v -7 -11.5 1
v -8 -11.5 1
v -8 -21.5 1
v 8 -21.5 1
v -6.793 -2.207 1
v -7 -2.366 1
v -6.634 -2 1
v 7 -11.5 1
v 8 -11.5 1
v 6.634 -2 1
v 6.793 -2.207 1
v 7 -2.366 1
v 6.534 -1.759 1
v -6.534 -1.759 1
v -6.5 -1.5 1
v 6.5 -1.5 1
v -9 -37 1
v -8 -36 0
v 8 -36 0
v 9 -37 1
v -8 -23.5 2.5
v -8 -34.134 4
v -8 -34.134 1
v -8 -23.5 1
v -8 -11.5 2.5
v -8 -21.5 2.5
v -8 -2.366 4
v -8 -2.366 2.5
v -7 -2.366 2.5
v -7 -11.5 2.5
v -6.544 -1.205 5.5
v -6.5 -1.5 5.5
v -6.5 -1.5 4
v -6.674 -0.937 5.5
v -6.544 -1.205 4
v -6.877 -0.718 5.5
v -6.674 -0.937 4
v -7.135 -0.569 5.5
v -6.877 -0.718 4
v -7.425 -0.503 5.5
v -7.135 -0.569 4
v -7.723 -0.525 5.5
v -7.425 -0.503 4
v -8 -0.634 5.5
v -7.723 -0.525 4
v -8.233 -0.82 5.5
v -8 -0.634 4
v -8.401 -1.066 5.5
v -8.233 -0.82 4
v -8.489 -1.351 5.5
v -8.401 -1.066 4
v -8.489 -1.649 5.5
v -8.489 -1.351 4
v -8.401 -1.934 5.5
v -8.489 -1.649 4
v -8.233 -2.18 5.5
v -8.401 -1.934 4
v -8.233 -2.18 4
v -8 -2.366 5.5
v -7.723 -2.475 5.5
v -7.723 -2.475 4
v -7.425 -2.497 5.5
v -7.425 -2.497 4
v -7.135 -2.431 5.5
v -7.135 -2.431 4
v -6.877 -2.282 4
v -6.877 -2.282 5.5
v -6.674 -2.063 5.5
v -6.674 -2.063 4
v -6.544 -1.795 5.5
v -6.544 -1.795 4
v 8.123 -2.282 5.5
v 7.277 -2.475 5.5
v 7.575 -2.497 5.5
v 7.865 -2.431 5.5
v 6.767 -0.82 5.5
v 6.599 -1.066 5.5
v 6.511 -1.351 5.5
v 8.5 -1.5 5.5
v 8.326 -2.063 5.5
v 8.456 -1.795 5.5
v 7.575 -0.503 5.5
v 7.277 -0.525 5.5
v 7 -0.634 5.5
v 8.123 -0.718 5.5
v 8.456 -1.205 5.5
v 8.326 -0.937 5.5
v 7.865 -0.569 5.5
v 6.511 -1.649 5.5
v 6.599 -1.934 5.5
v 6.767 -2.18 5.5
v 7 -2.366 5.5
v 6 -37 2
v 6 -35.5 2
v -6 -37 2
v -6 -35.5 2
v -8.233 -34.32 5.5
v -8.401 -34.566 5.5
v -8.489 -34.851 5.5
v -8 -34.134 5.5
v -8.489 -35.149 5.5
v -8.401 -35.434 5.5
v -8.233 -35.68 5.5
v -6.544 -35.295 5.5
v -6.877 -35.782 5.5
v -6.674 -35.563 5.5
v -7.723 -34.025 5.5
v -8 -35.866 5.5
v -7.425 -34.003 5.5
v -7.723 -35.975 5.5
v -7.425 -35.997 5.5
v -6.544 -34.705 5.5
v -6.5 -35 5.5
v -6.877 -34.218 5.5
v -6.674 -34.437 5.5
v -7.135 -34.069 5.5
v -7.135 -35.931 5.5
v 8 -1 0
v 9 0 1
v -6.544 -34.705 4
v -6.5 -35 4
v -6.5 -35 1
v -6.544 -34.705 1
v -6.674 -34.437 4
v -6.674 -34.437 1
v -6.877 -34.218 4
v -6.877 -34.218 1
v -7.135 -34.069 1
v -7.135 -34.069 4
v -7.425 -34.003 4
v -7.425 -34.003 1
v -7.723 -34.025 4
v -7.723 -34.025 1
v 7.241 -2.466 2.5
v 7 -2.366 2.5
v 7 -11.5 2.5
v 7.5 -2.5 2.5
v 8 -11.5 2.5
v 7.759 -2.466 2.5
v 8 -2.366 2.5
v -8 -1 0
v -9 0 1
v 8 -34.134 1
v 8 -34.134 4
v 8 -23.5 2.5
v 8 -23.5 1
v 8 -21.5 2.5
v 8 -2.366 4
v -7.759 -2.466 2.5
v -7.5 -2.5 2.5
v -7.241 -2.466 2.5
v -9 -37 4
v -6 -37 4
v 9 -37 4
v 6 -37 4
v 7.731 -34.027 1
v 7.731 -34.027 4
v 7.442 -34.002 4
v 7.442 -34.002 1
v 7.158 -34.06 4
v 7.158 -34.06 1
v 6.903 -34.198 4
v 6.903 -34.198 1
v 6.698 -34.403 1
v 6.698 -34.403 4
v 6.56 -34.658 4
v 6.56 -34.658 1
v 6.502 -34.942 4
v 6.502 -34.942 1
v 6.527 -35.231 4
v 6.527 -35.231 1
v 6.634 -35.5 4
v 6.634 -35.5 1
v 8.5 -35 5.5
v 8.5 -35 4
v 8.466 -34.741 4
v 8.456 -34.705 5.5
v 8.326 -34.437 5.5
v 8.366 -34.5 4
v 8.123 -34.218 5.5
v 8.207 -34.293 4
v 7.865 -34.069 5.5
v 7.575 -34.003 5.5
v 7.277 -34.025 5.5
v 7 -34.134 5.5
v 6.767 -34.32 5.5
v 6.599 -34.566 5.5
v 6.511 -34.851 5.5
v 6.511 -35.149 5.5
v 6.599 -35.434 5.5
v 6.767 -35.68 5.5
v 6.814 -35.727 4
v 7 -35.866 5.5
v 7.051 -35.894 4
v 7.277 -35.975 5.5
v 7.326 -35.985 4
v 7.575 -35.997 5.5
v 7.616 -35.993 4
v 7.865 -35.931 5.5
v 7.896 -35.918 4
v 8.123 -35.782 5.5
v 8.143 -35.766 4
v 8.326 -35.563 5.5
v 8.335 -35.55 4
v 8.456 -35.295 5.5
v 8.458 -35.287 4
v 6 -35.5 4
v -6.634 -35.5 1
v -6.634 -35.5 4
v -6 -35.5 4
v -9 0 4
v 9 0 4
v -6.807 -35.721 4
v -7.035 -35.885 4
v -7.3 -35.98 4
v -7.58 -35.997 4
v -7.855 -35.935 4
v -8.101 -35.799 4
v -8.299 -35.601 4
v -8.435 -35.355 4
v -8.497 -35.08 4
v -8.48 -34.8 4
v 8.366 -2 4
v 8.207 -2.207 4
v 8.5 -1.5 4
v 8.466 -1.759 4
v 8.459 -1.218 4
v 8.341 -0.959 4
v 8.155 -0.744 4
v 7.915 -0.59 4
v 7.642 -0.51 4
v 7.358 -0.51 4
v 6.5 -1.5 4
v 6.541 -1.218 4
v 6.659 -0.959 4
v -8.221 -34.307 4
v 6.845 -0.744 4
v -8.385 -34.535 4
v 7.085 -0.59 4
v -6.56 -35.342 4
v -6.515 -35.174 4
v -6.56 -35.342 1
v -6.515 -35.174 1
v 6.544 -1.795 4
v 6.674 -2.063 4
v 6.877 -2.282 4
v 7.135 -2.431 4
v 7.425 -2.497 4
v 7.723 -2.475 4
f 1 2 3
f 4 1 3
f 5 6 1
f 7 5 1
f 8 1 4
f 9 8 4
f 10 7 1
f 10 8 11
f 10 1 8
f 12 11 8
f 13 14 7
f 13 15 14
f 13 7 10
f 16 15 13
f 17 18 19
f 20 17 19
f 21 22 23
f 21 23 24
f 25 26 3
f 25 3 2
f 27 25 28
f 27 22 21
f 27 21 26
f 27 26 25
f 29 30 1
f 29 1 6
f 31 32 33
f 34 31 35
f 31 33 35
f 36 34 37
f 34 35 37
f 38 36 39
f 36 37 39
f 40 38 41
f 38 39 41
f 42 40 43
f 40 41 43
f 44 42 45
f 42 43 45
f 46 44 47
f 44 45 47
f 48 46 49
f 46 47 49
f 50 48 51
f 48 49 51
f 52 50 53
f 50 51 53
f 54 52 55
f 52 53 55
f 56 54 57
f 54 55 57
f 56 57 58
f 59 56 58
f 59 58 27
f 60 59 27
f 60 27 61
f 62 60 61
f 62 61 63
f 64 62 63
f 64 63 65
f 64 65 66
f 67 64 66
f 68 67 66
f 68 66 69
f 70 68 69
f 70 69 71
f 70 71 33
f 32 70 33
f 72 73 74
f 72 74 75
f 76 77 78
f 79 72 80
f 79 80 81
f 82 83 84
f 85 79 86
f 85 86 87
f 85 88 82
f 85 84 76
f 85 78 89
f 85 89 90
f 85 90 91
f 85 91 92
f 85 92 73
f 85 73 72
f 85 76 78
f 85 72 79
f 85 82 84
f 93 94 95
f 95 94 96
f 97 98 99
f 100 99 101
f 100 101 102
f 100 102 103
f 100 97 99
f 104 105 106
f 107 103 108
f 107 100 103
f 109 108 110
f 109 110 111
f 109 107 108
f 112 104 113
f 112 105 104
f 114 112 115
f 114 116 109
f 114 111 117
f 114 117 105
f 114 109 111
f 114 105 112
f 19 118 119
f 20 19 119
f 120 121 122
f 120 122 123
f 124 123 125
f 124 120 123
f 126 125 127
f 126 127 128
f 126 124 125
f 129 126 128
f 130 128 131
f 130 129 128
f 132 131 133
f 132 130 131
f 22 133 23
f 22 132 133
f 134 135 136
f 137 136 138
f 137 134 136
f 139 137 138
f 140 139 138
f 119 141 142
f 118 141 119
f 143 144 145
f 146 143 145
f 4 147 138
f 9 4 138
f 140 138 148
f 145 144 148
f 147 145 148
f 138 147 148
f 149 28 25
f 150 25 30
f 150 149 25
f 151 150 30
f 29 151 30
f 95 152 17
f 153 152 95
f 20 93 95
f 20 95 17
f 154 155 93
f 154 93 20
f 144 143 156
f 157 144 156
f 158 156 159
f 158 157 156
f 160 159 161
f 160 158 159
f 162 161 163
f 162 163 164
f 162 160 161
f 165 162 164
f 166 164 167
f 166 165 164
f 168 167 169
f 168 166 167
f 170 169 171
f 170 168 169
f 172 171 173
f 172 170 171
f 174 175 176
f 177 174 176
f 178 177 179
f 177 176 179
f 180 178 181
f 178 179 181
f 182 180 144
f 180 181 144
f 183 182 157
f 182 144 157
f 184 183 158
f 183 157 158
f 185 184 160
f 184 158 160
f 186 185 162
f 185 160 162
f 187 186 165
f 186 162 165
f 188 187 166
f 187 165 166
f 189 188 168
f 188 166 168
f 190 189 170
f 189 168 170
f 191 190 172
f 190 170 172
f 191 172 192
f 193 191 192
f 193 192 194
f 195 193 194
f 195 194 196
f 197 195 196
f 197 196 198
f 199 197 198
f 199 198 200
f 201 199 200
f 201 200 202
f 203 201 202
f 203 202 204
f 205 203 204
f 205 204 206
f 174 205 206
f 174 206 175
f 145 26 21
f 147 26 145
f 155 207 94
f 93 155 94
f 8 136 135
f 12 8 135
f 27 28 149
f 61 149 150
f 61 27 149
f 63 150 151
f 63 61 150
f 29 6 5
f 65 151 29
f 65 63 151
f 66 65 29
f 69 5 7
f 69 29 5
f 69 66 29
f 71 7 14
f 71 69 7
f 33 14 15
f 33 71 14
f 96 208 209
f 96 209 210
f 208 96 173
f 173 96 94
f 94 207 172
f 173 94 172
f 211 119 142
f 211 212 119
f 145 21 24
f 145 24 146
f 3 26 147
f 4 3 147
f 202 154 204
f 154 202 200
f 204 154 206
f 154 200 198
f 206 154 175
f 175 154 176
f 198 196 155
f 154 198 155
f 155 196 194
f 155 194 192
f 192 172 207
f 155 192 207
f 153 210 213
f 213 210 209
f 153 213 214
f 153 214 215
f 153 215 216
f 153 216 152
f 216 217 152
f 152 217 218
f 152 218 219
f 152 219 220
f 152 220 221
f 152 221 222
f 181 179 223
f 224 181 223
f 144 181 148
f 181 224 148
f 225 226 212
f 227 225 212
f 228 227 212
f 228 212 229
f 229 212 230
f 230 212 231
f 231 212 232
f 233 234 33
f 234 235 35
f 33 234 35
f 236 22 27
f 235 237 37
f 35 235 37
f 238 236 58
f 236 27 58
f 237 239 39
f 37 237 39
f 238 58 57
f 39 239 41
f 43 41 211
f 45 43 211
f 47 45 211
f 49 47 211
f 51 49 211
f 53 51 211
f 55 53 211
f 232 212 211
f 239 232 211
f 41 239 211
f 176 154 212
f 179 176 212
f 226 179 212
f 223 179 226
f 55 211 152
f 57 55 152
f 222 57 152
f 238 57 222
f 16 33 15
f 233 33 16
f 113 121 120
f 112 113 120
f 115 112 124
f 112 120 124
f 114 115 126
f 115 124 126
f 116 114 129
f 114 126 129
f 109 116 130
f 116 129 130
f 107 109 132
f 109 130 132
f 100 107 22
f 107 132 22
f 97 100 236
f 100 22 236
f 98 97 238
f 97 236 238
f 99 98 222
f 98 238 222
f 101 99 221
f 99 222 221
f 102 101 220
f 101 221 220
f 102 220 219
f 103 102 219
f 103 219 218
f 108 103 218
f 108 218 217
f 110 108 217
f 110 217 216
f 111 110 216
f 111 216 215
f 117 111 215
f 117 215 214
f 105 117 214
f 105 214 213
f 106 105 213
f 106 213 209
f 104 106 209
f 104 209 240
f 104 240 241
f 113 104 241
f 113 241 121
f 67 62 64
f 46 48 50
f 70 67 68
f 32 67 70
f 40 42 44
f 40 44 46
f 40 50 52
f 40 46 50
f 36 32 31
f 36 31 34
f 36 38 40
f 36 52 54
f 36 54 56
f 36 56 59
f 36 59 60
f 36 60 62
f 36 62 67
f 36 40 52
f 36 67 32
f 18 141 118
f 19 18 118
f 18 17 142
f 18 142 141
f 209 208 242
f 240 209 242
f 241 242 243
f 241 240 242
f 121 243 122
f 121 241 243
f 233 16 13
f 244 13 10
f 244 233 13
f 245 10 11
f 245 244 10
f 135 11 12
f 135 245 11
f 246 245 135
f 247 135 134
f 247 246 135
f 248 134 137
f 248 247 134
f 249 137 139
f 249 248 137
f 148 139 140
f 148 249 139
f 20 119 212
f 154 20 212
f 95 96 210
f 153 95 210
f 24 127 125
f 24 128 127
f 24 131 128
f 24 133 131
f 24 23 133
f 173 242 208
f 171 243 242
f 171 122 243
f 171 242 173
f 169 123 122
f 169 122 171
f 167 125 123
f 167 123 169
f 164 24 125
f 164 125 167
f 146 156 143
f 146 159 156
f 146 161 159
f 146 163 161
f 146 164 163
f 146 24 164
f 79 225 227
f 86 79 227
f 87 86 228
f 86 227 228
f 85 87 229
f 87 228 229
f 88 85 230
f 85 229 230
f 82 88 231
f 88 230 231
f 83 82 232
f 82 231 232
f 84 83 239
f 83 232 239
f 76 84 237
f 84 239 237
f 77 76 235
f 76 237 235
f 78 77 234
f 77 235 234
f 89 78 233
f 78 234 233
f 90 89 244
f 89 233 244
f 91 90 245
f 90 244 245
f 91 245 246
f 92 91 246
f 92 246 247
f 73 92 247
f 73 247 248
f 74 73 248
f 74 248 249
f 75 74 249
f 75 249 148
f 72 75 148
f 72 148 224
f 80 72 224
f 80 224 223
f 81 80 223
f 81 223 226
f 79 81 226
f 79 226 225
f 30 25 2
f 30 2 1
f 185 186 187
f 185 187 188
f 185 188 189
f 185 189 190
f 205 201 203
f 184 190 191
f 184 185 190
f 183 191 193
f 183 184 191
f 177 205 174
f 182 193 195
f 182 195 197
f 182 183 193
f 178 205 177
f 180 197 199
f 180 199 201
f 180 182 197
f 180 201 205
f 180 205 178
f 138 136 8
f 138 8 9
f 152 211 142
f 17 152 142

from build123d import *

# Parameters (mm, degrees)
F1_DEPTH       = 37
F2_W           = 12
F2_H           = 2
F3_DEPTH       = 2
F4_W           = 16
F4_H           = 34
F5_DEPTH       = 3
F7_W           = 1
F7_H           = 10
F7_W_2         = 16
F7_H_2         = 2
F8_DEPTH       = 1.5
F9_SIZE        = 1
F10_R          = 1
F11_DEPTH      = 1.5
F11_DEPTH_BACK = 3


with BuildPart() as f1:
    # F0 (on Front) → F1 (new body)
    with BuildSketch(Plane.XZ):
        Polygon((-9, 1), (-8, 0), (8, 0), (9, 1), (9, 4), (6, 4), (6, 2), (-6, 2), (-6, 4), (-9, 4), align=None)
    extrude(amount=F1_DEPTH)

    # F2 (on face) → F3 (join)
    with BuildSketch(Plane(origin=(0, 0, 0), x_dir=(-1, 0, 0), z_dir=(0, 1, 0))):
        with Locations((0, 3)):
            Rectangle(F2_W, F2_H)
    extrude(amount=-F3_DEPTH)

    # F4 (on face) → F5 (cut)
    with BuildSketch(Plane.XY.offset(4)):
        with Locations((0, -18.5)):
            Rectangle(F4_W, F4_H)
    extrude(amount=-F5_DEPTH, mode=Mode.SUBTRACT)

    # F7 (on offset) → F8 (join, through all)
    with BuildSketch(Plane.XY.offset(2.5)):
        with Locations((-7.5, -6.5)):
            Rectangle(F7_W, F7_H)
        with Locations((7.5, -6.5)):
            Rectangle(F7_W, F7_H)
        with Locations((0, -22.5)):
            Rectangle(F7_W_2, F7_H_2)
    extrude(amount=-F8_DEPTH)

    # F9
    f9_edges = [f1.edges().sort_by_distance(p)[0] for p in [
        (0, 0, 0),
        (0, -37, 0),
    ]]
    chamfer(f9_edges, length=F9_SIZE)

    # F10 (on face) → F11 (join, two sides)
    with BuildSketch(Plane.XY.offset(4)) as f11_sk:
        with Locations((7.5, -35)):
            Circle(F10_R)
        with Locations((-7.5, -35)):
            Circle(F10_R)
        with Locations((-7.5, -1.5)):
            Circle(F10_R)
        with Locations((7.5, -1.5)):
            Circle(F10_R)
    extrude(amount=F11_DEPTH)
    extrude(f11_sk.sketch, amount=-F11_DEPTH_BACK)


solid = f1.part
